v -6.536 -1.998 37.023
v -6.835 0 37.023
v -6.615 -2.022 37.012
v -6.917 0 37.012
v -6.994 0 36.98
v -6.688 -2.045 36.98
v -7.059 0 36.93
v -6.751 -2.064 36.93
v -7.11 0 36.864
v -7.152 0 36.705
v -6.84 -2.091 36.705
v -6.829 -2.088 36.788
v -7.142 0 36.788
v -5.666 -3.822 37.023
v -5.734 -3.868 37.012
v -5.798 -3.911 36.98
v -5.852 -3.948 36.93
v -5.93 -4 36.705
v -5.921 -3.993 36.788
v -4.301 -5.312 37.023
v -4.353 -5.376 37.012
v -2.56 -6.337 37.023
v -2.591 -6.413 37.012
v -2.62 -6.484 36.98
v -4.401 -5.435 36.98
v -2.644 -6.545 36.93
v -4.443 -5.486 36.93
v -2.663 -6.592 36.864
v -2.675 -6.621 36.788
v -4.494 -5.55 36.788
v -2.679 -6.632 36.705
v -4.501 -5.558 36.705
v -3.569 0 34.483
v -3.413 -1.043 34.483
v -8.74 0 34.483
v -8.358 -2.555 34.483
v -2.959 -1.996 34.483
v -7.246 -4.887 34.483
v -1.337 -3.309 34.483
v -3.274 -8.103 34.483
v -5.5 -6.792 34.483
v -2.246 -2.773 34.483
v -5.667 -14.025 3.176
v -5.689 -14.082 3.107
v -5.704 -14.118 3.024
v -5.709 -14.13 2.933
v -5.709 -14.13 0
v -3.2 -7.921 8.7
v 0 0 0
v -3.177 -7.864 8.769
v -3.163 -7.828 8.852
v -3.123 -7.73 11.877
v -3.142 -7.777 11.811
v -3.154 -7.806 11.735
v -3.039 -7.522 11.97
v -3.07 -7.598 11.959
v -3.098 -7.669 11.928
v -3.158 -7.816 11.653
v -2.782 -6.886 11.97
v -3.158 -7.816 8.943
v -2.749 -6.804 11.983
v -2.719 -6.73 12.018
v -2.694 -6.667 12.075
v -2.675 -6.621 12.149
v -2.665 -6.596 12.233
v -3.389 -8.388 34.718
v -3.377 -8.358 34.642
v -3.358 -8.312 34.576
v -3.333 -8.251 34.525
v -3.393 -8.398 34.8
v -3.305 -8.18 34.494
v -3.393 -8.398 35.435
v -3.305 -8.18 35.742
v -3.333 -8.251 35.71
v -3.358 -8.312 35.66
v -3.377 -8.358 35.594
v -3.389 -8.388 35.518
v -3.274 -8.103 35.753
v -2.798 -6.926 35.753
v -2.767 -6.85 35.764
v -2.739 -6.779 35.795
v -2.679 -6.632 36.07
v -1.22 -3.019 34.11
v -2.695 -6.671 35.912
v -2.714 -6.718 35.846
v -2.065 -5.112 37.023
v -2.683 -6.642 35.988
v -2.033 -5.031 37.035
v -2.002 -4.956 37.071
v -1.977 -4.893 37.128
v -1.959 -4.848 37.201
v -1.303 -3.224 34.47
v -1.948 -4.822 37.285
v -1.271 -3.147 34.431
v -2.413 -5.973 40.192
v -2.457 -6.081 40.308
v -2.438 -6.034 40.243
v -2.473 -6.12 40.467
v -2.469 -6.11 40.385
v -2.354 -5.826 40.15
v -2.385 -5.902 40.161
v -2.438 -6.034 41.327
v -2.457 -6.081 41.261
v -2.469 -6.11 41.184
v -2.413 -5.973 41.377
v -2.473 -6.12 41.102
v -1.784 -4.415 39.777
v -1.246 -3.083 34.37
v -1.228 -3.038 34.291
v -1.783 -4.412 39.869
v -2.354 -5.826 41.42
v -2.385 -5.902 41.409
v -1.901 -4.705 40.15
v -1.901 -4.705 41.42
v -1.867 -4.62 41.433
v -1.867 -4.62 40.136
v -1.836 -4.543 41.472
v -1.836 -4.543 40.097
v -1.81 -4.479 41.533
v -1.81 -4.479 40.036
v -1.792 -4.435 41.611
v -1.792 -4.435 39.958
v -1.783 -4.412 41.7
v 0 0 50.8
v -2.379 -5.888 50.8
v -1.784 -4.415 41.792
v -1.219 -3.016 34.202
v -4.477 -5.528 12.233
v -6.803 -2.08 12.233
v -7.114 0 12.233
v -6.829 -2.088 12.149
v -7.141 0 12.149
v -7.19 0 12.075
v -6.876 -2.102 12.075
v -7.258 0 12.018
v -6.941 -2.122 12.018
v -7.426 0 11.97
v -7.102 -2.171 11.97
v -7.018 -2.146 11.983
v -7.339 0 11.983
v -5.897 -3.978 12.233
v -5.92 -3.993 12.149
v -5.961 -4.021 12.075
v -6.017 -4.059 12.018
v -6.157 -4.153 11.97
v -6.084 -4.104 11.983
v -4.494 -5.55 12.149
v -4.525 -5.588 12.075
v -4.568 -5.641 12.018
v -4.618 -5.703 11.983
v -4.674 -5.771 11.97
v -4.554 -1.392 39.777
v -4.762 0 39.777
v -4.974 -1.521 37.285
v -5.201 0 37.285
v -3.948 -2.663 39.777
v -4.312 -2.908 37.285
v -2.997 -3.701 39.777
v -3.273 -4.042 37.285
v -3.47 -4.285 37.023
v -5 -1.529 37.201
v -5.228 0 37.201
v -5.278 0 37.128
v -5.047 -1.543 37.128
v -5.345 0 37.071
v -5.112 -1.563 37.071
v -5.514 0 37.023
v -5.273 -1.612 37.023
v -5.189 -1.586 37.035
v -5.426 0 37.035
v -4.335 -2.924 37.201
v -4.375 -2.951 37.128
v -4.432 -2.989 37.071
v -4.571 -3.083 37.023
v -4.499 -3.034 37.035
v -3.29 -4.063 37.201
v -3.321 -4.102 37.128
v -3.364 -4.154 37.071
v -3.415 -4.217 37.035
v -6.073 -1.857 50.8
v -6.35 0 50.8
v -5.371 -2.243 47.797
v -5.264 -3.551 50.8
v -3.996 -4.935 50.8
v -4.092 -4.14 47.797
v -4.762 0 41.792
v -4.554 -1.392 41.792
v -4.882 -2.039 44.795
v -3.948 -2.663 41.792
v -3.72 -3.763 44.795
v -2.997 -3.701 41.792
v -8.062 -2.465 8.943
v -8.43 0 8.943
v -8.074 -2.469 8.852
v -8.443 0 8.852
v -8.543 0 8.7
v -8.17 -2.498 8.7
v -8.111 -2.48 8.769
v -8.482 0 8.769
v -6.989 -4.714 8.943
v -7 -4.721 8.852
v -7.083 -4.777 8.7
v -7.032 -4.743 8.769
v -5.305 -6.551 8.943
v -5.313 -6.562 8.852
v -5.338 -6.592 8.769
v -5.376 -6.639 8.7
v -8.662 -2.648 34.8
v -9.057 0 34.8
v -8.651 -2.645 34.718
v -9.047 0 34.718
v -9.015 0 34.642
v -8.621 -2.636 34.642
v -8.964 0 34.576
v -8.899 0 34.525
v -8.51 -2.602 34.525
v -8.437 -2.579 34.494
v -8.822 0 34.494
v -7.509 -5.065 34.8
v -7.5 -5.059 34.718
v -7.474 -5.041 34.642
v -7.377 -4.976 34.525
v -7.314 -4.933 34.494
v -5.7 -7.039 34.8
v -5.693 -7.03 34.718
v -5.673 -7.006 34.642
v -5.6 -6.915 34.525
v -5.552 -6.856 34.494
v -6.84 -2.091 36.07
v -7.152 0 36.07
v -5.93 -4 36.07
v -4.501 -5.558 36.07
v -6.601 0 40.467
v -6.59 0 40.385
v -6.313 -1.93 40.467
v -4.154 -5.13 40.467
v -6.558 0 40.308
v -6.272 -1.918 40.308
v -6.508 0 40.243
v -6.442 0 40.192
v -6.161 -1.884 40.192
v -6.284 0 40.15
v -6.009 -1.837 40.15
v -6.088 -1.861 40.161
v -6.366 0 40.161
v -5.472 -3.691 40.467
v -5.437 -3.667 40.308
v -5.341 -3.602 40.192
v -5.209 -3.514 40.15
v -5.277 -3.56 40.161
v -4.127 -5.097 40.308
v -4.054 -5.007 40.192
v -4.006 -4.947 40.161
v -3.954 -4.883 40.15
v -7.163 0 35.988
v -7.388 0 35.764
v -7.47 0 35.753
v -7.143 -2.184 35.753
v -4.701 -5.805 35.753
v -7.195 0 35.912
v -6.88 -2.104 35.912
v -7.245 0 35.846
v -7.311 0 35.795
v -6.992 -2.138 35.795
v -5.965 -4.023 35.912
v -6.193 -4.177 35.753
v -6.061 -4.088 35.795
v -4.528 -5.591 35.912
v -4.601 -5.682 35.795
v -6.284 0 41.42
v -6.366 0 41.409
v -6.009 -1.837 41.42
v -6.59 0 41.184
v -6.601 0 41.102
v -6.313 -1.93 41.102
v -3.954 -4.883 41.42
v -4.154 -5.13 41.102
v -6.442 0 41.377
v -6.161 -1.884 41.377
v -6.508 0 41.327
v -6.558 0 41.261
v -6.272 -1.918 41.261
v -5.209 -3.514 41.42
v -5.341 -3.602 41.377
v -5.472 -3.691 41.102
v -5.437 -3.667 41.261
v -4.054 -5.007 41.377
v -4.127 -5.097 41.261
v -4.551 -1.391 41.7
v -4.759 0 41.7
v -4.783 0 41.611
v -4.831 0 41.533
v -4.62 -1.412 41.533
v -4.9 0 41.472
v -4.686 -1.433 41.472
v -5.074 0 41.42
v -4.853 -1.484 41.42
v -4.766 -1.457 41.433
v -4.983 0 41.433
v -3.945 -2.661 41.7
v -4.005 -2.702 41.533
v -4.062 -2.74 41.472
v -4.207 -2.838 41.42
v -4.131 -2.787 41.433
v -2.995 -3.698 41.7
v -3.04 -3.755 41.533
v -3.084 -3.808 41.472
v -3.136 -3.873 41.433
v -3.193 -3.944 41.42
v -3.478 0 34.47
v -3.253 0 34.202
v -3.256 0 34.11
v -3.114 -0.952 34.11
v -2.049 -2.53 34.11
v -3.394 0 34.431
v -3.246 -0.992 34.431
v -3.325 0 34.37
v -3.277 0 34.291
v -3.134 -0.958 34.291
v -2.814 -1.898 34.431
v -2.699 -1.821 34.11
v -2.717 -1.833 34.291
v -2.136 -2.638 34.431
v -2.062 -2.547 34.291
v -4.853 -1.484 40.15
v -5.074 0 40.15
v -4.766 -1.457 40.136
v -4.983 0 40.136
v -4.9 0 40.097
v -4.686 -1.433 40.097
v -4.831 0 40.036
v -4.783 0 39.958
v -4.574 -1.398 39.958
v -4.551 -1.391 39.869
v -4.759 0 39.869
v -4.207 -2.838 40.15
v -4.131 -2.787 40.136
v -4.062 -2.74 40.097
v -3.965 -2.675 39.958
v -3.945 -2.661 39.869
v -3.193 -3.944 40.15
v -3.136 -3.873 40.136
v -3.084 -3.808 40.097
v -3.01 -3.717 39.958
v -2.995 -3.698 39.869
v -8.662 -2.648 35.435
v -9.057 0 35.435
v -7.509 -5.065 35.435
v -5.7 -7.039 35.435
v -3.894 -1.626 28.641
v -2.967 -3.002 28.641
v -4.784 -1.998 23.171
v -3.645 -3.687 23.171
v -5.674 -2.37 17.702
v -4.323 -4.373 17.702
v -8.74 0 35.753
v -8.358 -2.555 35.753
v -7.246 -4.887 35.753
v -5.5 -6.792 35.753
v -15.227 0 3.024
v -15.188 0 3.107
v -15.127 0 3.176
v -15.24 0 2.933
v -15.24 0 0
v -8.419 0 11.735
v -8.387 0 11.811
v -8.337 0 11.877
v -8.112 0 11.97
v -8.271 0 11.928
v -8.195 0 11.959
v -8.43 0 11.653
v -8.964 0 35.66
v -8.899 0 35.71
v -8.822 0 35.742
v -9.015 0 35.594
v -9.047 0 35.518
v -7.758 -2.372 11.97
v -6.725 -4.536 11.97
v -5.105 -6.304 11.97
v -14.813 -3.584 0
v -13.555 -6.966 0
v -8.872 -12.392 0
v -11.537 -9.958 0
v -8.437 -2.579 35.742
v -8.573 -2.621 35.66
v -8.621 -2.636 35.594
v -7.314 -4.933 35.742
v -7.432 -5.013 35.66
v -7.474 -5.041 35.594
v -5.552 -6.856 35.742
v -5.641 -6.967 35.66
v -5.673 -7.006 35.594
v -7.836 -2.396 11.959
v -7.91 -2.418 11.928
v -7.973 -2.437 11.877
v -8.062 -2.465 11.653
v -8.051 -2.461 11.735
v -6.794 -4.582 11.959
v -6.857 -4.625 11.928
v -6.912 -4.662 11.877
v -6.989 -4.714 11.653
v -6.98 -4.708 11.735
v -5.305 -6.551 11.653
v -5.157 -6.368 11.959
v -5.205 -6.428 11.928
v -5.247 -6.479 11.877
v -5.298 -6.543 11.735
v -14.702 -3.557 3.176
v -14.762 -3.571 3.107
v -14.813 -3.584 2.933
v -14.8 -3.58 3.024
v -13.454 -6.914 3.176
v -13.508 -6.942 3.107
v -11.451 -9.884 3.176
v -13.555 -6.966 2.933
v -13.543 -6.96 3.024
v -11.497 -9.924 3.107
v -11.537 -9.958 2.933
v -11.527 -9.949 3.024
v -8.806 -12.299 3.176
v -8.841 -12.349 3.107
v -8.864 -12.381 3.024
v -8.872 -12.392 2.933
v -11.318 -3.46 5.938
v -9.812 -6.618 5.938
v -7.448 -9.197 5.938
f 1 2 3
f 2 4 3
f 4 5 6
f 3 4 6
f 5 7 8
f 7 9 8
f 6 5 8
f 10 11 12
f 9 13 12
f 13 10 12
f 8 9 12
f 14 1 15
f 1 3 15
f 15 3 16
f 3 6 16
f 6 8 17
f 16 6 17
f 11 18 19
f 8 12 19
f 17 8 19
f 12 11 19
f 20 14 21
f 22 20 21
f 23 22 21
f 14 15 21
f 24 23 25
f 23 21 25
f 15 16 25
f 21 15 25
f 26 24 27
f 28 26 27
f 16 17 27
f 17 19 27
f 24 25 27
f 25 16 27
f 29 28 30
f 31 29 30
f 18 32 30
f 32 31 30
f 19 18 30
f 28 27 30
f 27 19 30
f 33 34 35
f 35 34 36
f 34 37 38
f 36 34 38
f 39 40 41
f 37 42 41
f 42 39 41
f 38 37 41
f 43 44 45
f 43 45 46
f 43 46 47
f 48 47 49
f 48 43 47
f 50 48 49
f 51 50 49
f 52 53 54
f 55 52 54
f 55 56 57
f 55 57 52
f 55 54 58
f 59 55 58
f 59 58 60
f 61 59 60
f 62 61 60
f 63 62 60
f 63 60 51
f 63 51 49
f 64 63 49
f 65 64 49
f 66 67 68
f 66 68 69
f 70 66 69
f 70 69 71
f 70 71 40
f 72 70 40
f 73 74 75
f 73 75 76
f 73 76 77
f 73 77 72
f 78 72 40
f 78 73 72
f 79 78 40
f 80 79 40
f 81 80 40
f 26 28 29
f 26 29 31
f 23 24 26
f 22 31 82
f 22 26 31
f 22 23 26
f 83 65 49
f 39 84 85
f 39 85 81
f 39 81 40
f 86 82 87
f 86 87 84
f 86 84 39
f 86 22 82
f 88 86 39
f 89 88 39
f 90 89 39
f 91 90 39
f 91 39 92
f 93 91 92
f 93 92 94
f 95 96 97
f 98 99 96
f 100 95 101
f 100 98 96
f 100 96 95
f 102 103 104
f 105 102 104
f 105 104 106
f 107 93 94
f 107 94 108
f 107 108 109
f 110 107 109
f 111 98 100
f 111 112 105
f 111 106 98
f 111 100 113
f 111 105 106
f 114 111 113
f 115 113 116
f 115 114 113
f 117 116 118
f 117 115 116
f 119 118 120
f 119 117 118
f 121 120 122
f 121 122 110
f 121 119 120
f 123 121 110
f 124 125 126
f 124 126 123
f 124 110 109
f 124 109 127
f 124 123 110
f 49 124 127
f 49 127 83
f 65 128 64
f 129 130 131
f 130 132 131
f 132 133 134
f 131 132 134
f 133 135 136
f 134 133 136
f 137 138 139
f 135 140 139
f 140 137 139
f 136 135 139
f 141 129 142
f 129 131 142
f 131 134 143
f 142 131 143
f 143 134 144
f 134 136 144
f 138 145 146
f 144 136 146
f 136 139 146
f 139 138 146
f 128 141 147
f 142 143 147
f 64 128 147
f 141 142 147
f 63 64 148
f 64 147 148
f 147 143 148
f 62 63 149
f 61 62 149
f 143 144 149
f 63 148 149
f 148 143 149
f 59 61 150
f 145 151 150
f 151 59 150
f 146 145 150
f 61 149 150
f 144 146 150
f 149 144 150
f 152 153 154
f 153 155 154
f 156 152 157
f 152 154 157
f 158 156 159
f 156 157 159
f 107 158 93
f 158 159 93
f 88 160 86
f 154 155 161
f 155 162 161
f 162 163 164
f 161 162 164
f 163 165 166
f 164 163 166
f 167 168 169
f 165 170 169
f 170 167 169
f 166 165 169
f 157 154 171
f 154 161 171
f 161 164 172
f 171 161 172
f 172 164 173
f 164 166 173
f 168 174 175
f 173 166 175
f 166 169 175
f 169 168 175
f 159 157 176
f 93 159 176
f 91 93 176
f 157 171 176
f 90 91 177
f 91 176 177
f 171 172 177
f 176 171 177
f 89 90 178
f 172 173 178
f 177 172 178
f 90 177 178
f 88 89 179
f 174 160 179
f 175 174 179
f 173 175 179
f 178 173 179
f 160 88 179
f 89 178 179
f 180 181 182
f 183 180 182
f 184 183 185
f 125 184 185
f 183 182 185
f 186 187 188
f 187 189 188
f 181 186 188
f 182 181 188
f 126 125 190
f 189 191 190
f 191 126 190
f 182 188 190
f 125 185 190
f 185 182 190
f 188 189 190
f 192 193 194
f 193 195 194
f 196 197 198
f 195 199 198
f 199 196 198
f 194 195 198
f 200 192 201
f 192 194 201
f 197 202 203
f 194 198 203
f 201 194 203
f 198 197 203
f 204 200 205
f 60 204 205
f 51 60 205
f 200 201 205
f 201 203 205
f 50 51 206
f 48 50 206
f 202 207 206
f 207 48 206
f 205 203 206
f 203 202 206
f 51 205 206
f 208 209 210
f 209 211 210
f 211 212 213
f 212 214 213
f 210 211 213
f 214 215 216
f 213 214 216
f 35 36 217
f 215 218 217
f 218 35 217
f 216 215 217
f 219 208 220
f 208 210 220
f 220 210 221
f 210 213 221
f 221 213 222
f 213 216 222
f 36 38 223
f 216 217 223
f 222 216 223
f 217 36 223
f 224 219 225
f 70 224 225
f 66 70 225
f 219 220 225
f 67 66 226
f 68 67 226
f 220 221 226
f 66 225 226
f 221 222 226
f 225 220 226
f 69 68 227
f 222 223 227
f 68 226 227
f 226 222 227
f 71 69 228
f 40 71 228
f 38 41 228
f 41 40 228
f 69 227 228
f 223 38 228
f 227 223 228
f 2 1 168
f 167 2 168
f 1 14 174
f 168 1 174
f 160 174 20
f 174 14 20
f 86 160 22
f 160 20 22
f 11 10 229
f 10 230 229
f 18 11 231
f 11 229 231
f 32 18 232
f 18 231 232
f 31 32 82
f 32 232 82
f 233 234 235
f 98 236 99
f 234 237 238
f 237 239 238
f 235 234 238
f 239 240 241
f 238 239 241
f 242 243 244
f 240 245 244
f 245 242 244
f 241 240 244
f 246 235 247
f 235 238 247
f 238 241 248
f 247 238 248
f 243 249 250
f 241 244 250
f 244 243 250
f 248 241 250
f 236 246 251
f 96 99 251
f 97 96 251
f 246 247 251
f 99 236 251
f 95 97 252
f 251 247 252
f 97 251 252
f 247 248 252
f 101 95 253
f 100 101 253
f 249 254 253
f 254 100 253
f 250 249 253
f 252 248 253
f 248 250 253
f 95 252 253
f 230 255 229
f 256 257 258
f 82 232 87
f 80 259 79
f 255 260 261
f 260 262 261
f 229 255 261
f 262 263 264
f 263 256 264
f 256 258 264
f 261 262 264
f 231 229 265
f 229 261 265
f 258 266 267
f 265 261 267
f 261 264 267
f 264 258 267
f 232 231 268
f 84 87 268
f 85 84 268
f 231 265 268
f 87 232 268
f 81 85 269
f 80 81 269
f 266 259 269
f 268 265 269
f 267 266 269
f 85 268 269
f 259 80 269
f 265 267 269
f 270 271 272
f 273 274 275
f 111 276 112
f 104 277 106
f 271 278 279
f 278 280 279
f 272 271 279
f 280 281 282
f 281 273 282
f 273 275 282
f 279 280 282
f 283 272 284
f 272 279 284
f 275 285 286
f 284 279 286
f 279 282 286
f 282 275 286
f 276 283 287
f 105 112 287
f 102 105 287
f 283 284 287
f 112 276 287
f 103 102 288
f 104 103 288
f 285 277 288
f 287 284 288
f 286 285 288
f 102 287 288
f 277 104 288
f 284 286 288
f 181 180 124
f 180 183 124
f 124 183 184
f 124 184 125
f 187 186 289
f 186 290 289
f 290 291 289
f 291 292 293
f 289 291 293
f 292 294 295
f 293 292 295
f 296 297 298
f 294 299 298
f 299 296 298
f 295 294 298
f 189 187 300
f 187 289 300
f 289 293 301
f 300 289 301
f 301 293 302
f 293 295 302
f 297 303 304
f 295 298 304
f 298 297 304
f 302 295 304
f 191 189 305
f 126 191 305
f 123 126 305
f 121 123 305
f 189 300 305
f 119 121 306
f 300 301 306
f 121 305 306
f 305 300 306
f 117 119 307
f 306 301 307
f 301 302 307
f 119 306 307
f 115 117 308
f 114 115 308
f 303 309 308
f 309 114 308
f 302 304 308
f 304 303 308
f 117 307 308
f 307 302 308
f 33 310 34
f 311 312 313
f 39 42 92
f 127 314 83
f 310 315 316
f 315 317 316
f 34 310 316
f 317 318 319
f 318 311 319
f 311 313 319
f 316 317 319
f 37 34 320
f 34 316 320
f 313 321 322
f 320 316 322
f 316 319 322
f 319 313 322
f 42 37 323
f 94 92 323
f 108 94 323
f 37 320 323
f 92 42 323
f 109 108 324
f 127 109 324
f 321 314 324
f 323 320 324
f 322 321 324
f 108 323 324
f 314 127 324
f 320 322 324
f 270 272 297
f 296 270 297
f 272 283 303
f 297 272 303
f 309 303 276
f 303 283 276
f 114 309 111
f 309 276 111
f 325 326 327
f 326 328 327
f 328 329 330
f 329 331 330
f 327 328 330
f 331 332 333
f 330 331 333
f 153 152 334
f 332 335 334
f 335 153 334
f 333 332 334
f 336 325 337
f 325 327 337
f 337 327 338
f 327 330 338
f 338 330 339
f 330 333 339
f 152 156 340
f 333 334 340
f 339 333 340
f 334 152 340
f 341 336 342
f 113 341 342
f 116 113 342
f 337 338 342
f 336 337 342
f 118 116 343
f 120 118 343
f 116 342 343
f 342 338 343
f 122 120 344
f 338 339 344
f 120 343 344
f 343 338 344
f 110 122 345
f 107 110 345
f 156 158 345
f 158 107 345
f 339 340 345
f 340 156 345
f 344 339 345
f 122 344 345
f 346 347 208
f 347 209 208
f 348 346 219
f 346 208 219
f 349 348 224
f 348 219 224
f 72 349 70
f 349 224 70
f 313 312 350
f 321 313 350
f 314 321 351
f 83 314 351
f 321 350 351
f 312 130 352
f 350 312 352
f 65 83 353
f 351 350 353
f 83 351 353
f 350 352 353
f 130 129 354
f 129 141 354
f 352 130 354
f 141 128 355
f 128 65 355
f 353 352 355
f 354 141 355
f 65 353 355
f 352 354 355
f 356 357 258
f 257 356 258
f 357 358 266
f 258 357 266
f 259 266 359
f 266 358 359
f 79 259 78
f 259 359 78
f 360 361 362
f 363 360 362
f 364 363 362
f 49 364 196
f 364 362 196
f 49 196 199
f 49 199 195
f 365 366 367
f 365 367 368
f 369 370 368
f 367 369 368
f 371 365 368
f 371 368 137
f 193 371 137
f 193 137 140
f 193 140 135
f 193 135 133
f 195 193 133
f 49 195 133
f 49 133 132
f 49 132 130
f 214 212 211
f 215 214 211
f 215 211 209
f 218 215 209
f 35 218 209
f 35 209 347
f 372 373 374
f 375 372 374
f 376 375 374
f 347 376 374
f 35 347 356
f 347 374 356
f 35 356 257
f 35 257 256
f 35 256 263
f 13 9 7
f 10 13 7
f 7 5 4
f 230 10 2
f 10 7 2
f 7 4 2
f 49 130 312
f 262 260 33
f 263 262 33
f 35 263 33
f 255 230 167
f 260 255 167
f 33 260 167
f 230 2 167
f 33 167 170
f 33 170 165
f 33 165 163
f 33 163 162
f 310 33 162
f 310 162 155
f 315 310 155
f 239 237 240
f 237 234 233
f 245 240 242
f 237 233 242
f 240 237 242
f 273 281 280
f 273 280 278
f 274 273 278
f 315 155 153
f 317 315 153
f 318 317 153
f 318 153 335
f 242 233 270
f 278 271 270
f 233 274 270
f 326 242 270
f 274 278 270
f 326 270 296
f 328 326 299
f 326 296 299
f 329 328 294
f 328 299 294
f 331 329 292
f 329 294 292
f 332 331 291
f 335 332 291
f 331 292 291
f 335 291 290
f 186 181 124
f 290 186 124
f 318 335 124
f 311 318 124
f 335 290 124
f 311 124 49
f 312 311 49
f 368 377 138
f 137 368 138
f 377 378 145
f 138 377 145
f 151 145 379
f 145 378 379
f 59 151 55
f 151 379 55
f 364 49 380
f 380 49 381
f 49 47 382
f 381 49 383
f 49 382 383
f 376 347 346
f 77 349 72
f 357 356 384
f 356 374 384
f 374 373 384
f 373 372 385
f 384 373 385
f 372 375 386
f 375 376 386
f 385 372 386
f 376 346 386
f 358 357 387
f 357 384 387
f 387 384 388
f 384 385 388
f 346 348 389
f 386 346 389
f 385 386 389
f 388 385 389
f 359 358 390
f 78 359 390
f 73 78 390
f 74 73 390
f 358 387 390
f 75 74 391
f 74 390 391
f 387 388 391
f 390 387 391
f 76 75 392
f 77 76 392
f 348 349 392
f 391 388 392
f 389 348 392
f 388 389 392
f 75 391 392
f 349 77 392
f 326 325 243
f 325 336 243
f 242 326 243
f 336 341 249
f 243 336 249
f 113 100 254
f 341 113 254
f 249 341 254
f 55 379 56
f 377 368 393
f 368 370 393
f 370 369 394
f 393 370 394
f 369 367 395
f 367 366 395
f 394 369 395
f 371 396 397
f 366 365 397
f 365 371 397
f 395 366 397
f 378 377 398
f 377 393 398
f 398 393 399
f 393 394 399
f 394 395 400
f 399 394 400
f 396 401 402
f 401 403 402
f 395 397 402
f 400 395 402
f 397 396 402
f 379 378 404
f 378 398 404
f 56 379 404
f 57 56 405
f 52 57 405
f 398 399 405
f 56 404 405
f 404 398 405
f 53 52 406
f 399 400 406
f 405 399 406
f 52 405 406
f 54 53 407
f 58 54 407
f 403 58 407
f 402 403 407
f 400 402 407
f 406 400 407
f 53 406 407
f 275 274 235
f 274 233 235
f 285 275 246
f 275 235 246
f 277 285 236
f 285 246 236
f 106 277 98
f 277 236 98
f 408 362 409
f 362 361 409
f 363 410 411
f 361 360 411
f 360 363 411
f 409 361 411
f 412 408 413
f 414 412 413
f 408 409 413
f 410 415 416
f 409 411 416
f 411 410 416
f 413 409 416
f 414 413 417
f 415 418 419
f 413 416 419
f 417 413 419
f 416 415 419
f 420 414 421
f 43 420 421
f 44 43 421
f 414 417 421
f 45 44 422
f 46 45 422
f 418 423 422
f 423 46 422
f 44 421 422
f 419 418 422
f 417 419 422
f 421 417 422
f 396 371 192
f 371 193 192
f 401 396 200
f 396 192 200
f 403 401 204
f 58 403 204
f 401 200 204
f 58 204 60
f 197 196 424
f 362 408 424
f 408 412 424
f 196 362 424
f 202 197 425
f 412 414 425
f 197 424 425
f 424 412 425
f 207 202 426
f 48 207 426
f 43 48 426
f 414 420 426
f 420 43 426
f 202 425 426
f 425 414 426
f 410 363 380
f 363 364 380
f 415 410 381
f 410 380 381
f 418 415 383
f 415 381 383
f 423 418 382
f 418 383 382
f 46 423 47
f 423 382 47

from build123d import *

# Parameters (mm, degrees)
F1_ANGLE = 68


# Not quite as in the source:
# - a feature of the source that left no trace in its solid (it failed there, or was rolled back) is left out


with BuildPart() as f1:
    # F0 (on Front) → F1 (revolve)
    with BuildSketch(Plane.XZ):
        with BuildLine():
            Line((-15.24, 0), (0, 0))
            Line((0, 0), (0, 50.8))
            Line((0, 50.8), (-6.35, 50.8))
            Line((-6.35, 50.8), (-4.7617064118, 41.792339449))
            ThreePointArc((-4.7617064118, 41.792339449), (-4.8311637627, 41.5331210865), (-5.0743828734, 41.4197061526))
            Line((-5.0743828734, 41.4197061526), (-6.2835011077, 41.4197061526))
            ThreePointArc((-6.2835011077, 41.4197061526), (-6.5080075107, 41.3267125556), (-6.6010011077, 41.1022061526))
            Line((-6.6010011077, 41.1022061526), (-6.6010011077, 40.4672061526))
            ThreePointArc((-6.6010011077, 40.4672061526), (-6.5080075107, 40.2426997495), (-6.2835011077, 40.1497061526))
            Line((-6.2835011077, 40.1497061526), (-5.0743828734, 40.1497061526))
            ThreePointArc((-5.0743828734, 40.1497061526), (-4.8311637627, 40.0362912186), (-4.7617064118, 39.7770728561))
            Line((-4.7617064118, 39.7770728561), (-5.2010717431, 37.2853082403))
            ThreePointArc((-5.2010717431, 37.2853082403), (-5.3096631386, 37.0972224261), (-5.5137482047, 37.0229415367))
            Line((-5.5137482047, 37.0229415367), (-6.8348340718, 37.0229415367))
            ThreePointArc((-6.8348340718, 37.0229415367), (-7.0593404748, 36.9299479398), (-7.1523340718, 36.7054415367))
            Line((-7.1523340718, 36.7054415367), (-7.1523340718, 36.0704415367))
            ThreePointArc((-7.1523340718, 36.0704415367), (-7.2453276688, 35.8459351337), (-7.4698340718, 35.7529415367))
            Line((-7.4698340718, 35.7529415367), (-8.7398340718, 35.7529415367))
            ThreePointArc((-8.7398340718, 35.7529415367), (-8.9643404748, 35.6599479398), (-9.0573340718, 35.4354415367))
            Line((-9.0573340718, 35.4354415367), (-9.0573340718, 34.8004415367))
            ThreePointArc((-9.0573340718, 34.8004415367), (-8.9643404748, 34.5759351337), (-8.7398340718, 34.4829415367))
            Line((-8.7398340718, 34.4829415367), (-3.5686493249, 34.4829415367))
            ThreePointArc((-3.5686493249, 34.4829415367), (-3.3254302142, 34.3695266028), (-3.2559728633, 34.1103082403))
            Line((-3.2559728633, 34.1103082403), (-7.113602572, 12.2326030065))
            ThreePointArc((-7.113602572, 12.2326030065), (-7.2221939675, 12.0445171922), (-7.4262790336, 11.9702363029))
            Line((-7.4262790336, 11.9702363029), (-8.1123649007, 11.9702363029))
            ThreePointArc((-8.1123649007, 11.9702363029), (-8.3368713037, 11.8772427059), (-8.4298649007, 11.6527363029))
            Line((-8.4298649007, 11.6527363029), (-8.4298649007, 8.9432889844))
            ThreePointArc((-8.4298649007, 8.9432889844), (-8.4596121783, 8.8091076862), (-8.5432798346, 8.7000698737))
            Line((-8.5432798346, 8.7000698737), (-15.1265850661, 3.176020882))
            ThreePointArc((-15.1265850661, 3.176020882), (-15.2102527224, 3.0669830694), (-15.24, 2.9328017713))
            Line((-15.24, 2.9328017713), (-15.24, 0))
        make_face()
    revolve(axis=Axis((0, 0, 25.4), (0, 0, 1)), revolution_arc=F1_ANGLE)


solid = f1.part
